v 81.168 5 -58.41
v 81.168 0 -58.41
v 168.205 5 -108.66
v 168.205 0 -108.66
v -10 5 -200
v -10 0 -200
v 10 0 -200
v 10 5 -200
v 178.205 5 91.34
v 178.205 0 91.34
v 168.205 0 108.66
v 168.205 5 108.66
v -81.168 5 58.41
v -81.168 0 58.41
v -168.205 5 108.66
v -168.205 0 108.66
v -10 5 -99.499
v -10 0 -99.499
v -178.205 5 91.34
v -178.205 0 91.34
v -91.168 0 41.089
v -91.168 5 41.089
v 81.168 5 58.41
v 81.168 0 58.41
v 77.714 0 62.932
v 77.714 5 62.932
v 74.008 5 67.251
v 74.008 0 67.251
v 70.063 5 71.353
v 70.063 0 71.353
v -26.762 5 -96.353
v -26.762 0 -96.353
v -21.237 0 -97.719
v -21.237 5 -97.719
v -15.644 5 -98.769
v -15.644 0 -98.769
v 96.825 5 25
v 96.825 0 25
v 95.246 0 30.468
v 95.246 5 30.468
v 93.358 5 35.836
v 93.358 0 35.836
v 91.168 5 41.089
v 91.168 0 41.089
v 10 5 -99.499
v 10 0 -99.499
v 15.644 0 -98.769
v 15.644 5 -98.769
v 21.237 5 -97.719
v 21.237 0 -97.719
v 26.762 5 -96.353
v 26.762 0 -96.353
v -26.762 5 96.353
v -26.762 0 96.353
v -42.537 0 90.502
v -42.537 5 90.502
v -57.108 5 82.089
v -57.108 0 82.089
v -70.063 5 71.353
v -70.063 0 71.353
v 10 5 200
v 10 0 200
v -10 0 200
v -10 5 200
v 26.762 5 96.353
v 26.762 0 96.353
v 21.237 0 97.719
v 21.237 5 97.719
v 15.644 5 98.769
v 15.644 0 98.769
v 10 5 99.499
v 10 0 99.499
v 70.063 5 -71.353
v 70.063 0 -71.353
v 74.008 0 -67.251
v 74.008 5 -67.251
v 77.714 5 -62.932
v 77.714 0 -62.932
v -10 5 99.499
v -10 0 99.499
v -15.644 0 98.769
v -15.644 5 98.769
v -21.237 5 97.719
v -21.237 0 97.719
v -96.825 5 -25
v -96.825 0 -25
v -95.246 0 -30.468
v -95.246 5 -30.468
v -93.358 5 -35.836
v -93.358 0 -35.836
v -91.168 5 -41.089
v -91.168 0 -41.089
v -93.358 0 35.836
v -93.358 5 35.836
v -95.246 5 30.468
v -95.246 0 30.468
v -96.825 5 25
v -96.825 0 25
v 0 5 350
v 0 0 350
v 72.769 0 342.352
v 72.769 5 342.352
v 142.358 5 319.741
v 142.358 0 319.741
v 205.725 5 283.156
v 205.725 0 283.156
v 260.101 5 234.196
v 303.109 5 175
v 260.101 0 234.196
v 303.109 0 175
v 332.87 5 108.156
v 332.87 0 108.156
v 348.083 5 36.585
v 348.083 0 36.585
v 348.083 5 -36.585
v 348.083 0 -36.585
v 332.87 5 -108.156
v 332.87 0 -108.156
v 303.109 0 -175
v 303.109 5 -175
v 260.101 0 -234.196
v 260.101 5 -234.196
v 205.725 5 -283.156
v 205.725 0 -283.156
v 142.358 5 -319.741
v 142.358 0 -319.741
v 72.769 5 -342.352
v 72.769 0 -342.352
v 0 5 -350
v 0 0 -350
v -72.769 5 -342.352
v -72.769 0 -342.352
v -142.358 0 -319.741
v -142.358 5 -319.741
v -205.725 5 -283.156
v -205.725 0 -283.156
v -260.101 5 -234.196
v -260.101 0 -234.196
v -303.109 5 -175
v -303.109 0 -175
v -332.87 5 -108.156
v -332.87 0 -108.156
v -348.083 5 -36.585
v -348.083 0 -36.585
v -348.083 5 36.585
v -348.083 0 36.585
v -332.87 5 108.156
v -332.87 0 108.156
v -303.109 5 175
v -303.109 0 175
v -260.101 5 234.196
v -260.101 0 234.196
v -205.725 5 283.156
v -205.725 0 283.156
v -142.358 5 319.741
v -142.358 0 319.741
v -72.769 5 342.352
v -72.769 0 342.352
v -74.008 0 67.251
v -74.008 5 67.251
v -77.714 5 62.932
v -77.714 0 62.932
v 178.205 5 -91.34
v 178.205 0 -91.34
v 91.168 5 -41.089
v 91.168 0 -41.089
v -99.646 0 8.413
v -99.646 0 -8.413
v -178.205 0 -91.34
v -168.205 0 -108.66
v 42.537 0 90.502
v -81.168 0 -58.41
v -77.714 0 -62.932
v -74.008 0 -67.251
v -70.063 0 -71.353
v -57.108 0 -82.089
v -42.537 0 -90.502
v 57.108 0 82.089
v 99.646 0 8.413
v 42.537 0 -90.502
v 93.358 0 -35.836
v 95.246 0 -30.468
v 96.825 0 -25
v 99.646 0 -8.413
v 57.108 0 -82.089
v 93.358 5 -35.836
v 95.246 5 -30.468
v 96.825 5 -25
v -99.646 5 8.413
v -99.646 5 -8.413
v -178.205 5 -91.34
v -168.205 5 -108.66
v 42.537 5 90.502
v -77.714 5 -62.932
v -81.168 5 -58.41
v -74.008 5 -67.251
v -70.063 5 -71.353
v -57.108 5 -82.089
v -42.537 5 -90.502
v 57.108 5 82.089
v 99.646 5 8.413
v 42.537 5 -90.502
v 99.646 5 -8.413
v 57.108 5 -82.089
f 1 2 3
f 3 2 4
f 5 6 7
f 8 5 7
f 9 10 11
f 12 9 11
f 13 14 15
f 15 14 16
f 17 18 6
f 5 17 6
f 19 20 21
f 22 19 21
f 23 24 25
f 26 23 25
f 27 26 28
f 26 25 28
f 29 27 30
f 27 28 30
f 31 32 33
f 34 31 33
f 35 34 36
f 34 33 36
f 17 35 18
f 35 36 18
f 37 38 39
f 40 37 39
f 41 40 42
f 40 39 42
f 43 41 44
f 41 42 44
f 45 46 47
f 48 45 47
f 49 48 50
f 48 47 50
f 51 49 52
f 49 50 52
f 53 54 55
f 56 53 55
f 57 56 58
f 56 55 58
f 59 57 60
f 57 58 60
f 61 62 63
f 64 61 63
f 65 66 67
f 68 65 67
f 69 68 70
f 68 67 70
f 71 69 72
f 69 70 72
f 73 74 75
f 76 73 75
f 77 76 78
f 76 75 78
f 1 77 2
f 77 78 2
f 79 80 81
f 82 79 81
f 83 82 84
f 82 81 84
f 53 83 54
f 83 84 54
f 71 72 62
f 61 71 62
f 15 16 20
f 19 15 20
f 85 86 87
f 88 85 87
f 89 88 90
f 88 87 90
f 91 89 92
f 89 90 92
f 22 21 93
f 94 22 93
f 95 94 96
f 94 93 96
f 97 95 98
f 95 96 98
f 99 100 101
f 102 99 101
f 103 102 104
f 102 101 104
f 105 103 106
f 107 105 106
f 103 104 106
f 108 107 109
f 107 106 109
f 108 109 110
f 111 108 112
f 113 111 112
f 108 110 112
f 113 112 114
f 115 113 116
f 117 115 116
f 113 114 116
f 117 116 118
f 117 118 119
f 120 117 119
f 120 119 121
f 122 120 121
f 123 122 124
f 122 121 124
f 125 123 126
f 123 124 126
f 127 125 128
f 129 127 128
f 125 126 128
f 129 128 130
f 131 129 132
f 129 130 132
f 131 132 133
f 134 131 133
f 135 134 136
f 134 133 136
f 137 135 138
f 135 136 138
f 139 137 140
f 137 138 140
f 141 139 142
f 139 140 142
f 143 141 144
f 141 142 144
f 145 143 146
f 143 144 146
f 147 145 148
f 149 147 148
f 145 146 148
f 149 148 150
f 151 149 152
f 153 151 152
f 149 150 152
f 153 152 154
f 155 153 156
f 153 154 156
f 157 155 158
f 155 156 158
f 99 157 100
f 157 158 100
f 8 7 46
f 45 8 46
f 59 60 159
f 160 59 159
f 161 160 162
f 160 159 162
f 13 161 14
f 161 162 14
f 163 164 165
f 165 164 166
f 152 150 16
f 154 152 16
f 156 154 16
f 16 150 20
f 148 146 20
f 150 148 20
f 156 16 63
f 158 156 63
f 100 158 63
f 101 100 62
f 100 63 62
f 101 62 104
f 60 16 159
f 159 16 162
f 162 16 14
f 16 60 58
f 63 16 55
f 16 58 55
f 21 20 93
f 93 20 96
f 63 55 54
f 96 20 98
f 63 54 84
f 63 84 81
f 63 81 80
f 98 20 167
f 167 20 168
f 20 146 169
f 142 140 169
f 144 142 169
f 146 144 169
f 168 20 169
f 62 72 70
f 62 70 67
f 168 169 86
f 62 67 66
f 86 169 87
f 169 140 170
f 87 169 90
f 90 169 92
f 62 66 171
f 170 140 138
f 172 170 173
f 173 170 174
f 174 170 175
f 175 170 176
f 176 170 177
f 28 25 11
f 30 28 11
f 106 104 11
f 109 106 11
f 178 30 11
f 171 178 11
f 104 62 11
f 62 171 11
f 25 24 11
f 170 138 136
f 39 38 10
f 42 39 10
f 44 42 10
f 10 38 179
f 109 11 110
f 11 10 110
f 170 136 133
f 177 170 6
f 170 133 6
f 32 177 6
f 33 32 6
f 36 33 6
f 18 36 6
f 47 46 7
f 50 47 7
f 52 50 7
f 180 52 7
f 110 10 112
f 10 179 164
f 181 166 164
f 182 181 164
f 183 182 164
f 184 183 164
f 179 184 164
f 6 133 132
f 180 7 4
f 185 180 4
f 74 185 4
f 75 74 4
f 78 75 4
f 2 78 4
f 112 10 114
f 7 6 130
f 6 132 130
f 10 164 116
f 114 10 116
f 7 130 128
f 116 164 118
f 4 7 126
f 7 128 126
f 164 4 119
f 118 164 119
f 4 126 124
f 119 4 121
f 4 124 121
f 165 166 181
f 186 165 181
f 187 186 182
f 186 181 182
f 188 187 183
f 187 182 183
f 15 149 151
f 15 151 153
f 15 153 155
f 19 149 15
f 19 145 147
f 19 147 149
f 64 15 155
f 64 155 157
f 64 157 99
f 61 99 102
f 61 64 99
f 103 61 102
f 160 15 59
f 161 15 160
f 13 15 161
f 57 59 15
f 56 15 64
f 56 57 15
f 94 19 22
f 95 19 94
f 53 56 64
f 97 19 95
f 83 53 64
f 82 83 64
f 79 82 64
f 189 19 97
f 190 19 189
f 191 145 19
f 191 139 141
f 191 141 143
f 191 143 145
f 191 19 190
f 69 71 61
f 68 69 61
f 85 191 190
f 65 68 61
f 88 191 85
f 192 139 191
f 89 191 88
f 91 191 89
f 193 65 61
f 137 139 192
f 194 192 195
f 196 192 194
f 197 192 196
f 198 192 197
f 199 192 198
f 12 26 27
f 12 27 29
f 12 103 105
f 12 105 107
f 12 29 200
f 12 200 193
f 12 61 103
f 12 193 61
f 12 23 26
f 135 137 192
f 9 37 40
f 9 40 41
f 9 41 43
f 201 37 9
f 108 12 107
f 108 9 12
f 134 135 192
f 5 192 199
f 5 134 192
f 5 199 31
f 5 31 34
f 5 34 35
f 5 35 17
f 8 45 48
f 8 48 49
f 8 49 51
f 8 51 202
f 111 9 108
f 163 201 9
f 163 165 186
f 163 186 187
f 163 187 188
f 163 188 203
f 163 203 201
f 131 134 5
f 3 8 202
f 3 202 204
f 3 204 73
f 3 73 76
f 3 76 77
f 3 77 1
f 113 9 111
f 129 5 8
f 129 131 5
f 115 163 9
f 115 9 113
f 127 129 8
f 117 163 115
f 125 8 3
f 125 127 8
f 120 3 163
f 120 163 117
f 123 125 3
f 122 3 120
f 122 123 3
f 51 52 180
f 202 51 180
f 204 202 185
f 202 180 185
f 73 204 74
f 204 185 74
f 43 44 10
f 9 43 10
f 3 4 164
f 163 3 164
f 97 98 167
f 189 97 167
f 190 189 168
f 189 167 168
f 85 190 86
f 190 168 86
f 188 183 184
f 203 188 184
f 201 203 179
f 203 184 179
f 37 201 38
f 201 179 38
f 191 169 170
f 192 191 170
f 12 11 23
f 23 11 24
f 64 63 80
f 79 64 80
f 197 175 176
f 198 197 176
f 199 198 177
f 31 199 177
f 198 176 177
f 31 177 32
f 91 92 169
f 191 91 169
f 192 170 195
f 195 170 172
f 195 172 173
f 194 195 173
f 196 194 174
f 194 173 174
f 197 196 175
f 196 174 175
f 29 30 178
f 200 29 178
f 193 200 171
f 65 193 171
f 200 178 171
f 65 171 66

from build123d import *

# Parameters (mm, degrees)
IZIM1_R                     = 350
Y_KSEKLIK_EKSTR_ZYON1_DEPTH = 5


with BuildPart() as part:
    # Çizim1 → Yükseklik-Ekstrüzyon1 (new body)
    # profile 1 of 7: a face of its own
    with BuildSketch(Plane(origin=(0, 0, 0), x_dir=(1, 0, 0), z_dir=(0, 1, 0))):
        with Locations(Location((0, 0, 0), (0, 0, 270))):
            Circle(IZIM1_R)
        with BuildLine():
            ThreePointArc((70.062926922, 71.352549156), (75.892103529, 65.118266423), (81.168439698, 58.409625893))
            Line((81.168439698, 58.409625893), (168.205080757, 108.660254038))
            Line((168.205080757, 108.660254038), (178.205080757, 91.339745962))
            Line((178.205080757, 91.339745962), (91.168439698, 41.089117818))
            ThreePointArc((91.168439698, 41.089117818), (94.340124737, 33.165356392), (96.824583655, 25))
            Line((96.824583655, 25), (150, 55.700840941))
            Line((150, 55.700840941), (150, -55.700840941))
            Line((150, -55.700840941), (96.824583655, -25))
            ThreePointArc((96.824583655, -25), (94.340124737, -33.165356392), (91.168439698, -41.089117817))
            Line((91.168439698, -41.089117817), (178.205080757, -91.339745962))
            Line((178.205080757, -91.339745962), (168.205080757, -108.660254038))
            Line((168.205080757, -108.660254038), (81.168439698, -58.409625893))
            ThreePointArc((81.168439698, -58.409625893), (75.892103529, -65.118266423), (70.062926922, -71.352549156))
            Line((70.062926922, -71.352549156), (123.238343267, -102.053390097))
            Line((123.238343267, -102.053390097), (26.761656733, -157.754231038))
            Line((26.761656733, -157.754231038), (26.761656733, -96.352549156))
            ThreePointArc((26.761656733, -96.352549156), (18.448021208, -98.283622814), (10, -99.498743711))
            Line((10, -99.498743711), (10, -200))
            Line((10, -200), (-10, -200))
            Line((-10, -200), (-10, -99.498743711))
            ThreePointArc((-10, -99.498743711), (-18.448021208, -98.283622814), (-26.761656733, -96.352549156))
            Line((-26.761656733, -96.352549156), (-26.761656733, -157.754231038))
            Line((-26.761656733, -157.754231038), (-123.238343267, -102.053390097))
            Line((-123.238343267, -102.053390097), (-70.062926922, -71.352549156))
            ThreePointArc((-70.062926922, -71.352549156), (-75.892103529, -65.118266423), (-81.168439698, -58.409625893))
            Line((-81.168439698, -58.409625893), (-168.205080757, -108.660254038))
            Line((-168.205080757, -108.660254038), (-178.205080757, -91.339745962))
            Line((-178.205080757, -91.339745962), (-91.168439698, -41.089117817))
            ThreePointArc((-91.168439698, -41.089117817), (-94.340124737, -33.165356392), (-96.824583655, -25))
            Line((-96.824583655, -25), (-150, -55.700840941))
            Line((-150, -55.700840941), (-150, 55.700840941))
            Line((-150, 55.700840941), (-96.824583655, 25))
            ThreePointArc((-96.824583655, 25), (-94.340124737, 33.165356392), (-91.168439698, 41.089117818))
            Line((-91.168439698, 41.089117818), (-178.205080757, 91.339745962))
            Line((-178.205080757, 91.339745962), (-168.205080757, 108.660254038))
            Line((-168.205080757, 108.660254038), (-81.168439698, 58.409625893))
            ThreePointArc((-81.168439698, 58.409625893), (-75.892103529, 65.118266423), (-70.062926922, 71.352549156))
            Line((-70.062926922, 71.352549156), (-123.238343267, 102.053390097))
            Line((-123.238343267, 102.053390097), (-26.761656733, 157.754231038))
            Line((-26.761656733, 157.754231038), (-26.761656733, 96.352549156))
            ThreePointArc((-26.761656733, 96.352549156), (-18.448021208, 98.283622814), (-10, 99.498743711))
            Line((-10, 99.498743711), (-10, 200))
            Line((-10, 200), (10, 200))
            Line((10, 200), (10, 99.498743711))
            ThreePointArc((10, 99.498743711), (18.448021208, 98.283622814), (26.761656733, 96.352549156))
            Line((26.761656733, 96.352549156), (26.761656733, 157.754231038))
            Line((26.761656733, 157.754231038), (123.238343267, 102.053390097))
            Line((123.238343267, 102.053390097), (70.062926922, 71.352549156))
        make_face(mode=Mode.SUBTRACT)
    # profile 2 of 7: a face of its own
    with BuildSketch(Plane(origin=(0, 0, 0), x_dir=(1, 0, 0), z_dir=(0, 1, 0))):
        with BuildLine():
            Line((-26.761656733, -157.754231038), (-26.761656733, -96.352549156))
            ThreePointArc((-26.761656733, -96.352549156), (-50, -86.602540378), (-70.062926922, -71.352549156))
            Line((-70.062926922, -71.352549156), (-123.238343267, -102.053390097))
            Line((-123.238343267, -102.053390097), (-26.761656733, -157.754231038))
        make_face()
    # profile 3 of 7: a face of its own
    with BuildSketch(Plane(origin=(0, 0, 0), x_dir=(1, 0, 0), z_dir=(0, 1, 0))):
        with BuildLine():
            ThreePointArc((-96.824583655, -25), (-100, 0), (-96.824583655, 25))
            Line((-96.824583655, 25), (-150, 55.700840941))
            Line((-150, 55.700840941), (-150, -55.700840941))
            Line((-150, -55.700840941), (-96.824583655, -25))
        make_face()
    # profile 4 of 7: a face of its own
    with BuildSketch(Plane(origin=(0, 0, 0), x_dir=(1, 0, 0), z_dir=(0, 1, 0))):
        with BuildLine():
            ThreePointArc((-70.062926922, 71.352549156), (-50, 86.602540378), (-26.761656733, 96.352549156))
            Line((-26.761656733, 96.352549156), (-26.761656733, 157.754231038))
            Line((-26.761656733, 157.754231038), (-123.238343267, 102.053390097))
            Line((-123.238343267, 102.053390097), (-70.062926922, 71.352549156))
        make_face()
    # profile 5 of 7: a face of its own
    with BuildSketch(Plane(origin=(0, 0, 0), x_dir=(1, 0, 0), z_dir=(0, 1, 0))):
        with BuildLine():
            ThreePointArc((26.761656733, 96.352549156), (50, 86.602540378), (70.062926922, 71.352549156))
            Line((70.062926922, 71.352549156), (123.238343267, 102.053390097))
            Line((123.238343267, 102.053390097), (26.761656733, 157.754231038))
            Line((26.761656733, 157.754231038), (26.761656733, 96.352549156))
        make_face()
    # profile 6 of 7: a face of its own
    with BuildSketch(Plane(origin=(0, 0, 0), x_dir=(1, 0, 0), z_dir=(0, 1, 0))):
        with BuildLine():
            Line((150, 55.700840941), (96.824583655, 25))
            ThreePointArc((96.824583655, 25), (100, 0), (96.824583655, -25))
            Line((96.824583655, -25), (150, -55.700840941))
            Line((150, -55.700840941), (150, 55.700840941))
        make_face()
    # profile 7 of 7: a face of its own
    with BuildSketch(Plane(origin=(0, 0, 0), x_dir=(1, 0, 0), z_dir=(0, 1, 0))):
        with BuildLine():
            Line((123.238343267, -102.053390097), (70.062926922, -71.352549156))
            ThreePointArc((70.062926922, -71.352549156), (50, -86.602540378), (26.761656733, -96.352549156))
            Line((26.761656733, -96.352549156), (26.761656733, -157.754231038))
            Line((26.761656733, -157.754231038), (123.238343267, -102.053390097))
        make_face()
    extrude(amount=Y_KSEKLIK_EKSTR_ZYON1_DEPTH)


solid = part.part
